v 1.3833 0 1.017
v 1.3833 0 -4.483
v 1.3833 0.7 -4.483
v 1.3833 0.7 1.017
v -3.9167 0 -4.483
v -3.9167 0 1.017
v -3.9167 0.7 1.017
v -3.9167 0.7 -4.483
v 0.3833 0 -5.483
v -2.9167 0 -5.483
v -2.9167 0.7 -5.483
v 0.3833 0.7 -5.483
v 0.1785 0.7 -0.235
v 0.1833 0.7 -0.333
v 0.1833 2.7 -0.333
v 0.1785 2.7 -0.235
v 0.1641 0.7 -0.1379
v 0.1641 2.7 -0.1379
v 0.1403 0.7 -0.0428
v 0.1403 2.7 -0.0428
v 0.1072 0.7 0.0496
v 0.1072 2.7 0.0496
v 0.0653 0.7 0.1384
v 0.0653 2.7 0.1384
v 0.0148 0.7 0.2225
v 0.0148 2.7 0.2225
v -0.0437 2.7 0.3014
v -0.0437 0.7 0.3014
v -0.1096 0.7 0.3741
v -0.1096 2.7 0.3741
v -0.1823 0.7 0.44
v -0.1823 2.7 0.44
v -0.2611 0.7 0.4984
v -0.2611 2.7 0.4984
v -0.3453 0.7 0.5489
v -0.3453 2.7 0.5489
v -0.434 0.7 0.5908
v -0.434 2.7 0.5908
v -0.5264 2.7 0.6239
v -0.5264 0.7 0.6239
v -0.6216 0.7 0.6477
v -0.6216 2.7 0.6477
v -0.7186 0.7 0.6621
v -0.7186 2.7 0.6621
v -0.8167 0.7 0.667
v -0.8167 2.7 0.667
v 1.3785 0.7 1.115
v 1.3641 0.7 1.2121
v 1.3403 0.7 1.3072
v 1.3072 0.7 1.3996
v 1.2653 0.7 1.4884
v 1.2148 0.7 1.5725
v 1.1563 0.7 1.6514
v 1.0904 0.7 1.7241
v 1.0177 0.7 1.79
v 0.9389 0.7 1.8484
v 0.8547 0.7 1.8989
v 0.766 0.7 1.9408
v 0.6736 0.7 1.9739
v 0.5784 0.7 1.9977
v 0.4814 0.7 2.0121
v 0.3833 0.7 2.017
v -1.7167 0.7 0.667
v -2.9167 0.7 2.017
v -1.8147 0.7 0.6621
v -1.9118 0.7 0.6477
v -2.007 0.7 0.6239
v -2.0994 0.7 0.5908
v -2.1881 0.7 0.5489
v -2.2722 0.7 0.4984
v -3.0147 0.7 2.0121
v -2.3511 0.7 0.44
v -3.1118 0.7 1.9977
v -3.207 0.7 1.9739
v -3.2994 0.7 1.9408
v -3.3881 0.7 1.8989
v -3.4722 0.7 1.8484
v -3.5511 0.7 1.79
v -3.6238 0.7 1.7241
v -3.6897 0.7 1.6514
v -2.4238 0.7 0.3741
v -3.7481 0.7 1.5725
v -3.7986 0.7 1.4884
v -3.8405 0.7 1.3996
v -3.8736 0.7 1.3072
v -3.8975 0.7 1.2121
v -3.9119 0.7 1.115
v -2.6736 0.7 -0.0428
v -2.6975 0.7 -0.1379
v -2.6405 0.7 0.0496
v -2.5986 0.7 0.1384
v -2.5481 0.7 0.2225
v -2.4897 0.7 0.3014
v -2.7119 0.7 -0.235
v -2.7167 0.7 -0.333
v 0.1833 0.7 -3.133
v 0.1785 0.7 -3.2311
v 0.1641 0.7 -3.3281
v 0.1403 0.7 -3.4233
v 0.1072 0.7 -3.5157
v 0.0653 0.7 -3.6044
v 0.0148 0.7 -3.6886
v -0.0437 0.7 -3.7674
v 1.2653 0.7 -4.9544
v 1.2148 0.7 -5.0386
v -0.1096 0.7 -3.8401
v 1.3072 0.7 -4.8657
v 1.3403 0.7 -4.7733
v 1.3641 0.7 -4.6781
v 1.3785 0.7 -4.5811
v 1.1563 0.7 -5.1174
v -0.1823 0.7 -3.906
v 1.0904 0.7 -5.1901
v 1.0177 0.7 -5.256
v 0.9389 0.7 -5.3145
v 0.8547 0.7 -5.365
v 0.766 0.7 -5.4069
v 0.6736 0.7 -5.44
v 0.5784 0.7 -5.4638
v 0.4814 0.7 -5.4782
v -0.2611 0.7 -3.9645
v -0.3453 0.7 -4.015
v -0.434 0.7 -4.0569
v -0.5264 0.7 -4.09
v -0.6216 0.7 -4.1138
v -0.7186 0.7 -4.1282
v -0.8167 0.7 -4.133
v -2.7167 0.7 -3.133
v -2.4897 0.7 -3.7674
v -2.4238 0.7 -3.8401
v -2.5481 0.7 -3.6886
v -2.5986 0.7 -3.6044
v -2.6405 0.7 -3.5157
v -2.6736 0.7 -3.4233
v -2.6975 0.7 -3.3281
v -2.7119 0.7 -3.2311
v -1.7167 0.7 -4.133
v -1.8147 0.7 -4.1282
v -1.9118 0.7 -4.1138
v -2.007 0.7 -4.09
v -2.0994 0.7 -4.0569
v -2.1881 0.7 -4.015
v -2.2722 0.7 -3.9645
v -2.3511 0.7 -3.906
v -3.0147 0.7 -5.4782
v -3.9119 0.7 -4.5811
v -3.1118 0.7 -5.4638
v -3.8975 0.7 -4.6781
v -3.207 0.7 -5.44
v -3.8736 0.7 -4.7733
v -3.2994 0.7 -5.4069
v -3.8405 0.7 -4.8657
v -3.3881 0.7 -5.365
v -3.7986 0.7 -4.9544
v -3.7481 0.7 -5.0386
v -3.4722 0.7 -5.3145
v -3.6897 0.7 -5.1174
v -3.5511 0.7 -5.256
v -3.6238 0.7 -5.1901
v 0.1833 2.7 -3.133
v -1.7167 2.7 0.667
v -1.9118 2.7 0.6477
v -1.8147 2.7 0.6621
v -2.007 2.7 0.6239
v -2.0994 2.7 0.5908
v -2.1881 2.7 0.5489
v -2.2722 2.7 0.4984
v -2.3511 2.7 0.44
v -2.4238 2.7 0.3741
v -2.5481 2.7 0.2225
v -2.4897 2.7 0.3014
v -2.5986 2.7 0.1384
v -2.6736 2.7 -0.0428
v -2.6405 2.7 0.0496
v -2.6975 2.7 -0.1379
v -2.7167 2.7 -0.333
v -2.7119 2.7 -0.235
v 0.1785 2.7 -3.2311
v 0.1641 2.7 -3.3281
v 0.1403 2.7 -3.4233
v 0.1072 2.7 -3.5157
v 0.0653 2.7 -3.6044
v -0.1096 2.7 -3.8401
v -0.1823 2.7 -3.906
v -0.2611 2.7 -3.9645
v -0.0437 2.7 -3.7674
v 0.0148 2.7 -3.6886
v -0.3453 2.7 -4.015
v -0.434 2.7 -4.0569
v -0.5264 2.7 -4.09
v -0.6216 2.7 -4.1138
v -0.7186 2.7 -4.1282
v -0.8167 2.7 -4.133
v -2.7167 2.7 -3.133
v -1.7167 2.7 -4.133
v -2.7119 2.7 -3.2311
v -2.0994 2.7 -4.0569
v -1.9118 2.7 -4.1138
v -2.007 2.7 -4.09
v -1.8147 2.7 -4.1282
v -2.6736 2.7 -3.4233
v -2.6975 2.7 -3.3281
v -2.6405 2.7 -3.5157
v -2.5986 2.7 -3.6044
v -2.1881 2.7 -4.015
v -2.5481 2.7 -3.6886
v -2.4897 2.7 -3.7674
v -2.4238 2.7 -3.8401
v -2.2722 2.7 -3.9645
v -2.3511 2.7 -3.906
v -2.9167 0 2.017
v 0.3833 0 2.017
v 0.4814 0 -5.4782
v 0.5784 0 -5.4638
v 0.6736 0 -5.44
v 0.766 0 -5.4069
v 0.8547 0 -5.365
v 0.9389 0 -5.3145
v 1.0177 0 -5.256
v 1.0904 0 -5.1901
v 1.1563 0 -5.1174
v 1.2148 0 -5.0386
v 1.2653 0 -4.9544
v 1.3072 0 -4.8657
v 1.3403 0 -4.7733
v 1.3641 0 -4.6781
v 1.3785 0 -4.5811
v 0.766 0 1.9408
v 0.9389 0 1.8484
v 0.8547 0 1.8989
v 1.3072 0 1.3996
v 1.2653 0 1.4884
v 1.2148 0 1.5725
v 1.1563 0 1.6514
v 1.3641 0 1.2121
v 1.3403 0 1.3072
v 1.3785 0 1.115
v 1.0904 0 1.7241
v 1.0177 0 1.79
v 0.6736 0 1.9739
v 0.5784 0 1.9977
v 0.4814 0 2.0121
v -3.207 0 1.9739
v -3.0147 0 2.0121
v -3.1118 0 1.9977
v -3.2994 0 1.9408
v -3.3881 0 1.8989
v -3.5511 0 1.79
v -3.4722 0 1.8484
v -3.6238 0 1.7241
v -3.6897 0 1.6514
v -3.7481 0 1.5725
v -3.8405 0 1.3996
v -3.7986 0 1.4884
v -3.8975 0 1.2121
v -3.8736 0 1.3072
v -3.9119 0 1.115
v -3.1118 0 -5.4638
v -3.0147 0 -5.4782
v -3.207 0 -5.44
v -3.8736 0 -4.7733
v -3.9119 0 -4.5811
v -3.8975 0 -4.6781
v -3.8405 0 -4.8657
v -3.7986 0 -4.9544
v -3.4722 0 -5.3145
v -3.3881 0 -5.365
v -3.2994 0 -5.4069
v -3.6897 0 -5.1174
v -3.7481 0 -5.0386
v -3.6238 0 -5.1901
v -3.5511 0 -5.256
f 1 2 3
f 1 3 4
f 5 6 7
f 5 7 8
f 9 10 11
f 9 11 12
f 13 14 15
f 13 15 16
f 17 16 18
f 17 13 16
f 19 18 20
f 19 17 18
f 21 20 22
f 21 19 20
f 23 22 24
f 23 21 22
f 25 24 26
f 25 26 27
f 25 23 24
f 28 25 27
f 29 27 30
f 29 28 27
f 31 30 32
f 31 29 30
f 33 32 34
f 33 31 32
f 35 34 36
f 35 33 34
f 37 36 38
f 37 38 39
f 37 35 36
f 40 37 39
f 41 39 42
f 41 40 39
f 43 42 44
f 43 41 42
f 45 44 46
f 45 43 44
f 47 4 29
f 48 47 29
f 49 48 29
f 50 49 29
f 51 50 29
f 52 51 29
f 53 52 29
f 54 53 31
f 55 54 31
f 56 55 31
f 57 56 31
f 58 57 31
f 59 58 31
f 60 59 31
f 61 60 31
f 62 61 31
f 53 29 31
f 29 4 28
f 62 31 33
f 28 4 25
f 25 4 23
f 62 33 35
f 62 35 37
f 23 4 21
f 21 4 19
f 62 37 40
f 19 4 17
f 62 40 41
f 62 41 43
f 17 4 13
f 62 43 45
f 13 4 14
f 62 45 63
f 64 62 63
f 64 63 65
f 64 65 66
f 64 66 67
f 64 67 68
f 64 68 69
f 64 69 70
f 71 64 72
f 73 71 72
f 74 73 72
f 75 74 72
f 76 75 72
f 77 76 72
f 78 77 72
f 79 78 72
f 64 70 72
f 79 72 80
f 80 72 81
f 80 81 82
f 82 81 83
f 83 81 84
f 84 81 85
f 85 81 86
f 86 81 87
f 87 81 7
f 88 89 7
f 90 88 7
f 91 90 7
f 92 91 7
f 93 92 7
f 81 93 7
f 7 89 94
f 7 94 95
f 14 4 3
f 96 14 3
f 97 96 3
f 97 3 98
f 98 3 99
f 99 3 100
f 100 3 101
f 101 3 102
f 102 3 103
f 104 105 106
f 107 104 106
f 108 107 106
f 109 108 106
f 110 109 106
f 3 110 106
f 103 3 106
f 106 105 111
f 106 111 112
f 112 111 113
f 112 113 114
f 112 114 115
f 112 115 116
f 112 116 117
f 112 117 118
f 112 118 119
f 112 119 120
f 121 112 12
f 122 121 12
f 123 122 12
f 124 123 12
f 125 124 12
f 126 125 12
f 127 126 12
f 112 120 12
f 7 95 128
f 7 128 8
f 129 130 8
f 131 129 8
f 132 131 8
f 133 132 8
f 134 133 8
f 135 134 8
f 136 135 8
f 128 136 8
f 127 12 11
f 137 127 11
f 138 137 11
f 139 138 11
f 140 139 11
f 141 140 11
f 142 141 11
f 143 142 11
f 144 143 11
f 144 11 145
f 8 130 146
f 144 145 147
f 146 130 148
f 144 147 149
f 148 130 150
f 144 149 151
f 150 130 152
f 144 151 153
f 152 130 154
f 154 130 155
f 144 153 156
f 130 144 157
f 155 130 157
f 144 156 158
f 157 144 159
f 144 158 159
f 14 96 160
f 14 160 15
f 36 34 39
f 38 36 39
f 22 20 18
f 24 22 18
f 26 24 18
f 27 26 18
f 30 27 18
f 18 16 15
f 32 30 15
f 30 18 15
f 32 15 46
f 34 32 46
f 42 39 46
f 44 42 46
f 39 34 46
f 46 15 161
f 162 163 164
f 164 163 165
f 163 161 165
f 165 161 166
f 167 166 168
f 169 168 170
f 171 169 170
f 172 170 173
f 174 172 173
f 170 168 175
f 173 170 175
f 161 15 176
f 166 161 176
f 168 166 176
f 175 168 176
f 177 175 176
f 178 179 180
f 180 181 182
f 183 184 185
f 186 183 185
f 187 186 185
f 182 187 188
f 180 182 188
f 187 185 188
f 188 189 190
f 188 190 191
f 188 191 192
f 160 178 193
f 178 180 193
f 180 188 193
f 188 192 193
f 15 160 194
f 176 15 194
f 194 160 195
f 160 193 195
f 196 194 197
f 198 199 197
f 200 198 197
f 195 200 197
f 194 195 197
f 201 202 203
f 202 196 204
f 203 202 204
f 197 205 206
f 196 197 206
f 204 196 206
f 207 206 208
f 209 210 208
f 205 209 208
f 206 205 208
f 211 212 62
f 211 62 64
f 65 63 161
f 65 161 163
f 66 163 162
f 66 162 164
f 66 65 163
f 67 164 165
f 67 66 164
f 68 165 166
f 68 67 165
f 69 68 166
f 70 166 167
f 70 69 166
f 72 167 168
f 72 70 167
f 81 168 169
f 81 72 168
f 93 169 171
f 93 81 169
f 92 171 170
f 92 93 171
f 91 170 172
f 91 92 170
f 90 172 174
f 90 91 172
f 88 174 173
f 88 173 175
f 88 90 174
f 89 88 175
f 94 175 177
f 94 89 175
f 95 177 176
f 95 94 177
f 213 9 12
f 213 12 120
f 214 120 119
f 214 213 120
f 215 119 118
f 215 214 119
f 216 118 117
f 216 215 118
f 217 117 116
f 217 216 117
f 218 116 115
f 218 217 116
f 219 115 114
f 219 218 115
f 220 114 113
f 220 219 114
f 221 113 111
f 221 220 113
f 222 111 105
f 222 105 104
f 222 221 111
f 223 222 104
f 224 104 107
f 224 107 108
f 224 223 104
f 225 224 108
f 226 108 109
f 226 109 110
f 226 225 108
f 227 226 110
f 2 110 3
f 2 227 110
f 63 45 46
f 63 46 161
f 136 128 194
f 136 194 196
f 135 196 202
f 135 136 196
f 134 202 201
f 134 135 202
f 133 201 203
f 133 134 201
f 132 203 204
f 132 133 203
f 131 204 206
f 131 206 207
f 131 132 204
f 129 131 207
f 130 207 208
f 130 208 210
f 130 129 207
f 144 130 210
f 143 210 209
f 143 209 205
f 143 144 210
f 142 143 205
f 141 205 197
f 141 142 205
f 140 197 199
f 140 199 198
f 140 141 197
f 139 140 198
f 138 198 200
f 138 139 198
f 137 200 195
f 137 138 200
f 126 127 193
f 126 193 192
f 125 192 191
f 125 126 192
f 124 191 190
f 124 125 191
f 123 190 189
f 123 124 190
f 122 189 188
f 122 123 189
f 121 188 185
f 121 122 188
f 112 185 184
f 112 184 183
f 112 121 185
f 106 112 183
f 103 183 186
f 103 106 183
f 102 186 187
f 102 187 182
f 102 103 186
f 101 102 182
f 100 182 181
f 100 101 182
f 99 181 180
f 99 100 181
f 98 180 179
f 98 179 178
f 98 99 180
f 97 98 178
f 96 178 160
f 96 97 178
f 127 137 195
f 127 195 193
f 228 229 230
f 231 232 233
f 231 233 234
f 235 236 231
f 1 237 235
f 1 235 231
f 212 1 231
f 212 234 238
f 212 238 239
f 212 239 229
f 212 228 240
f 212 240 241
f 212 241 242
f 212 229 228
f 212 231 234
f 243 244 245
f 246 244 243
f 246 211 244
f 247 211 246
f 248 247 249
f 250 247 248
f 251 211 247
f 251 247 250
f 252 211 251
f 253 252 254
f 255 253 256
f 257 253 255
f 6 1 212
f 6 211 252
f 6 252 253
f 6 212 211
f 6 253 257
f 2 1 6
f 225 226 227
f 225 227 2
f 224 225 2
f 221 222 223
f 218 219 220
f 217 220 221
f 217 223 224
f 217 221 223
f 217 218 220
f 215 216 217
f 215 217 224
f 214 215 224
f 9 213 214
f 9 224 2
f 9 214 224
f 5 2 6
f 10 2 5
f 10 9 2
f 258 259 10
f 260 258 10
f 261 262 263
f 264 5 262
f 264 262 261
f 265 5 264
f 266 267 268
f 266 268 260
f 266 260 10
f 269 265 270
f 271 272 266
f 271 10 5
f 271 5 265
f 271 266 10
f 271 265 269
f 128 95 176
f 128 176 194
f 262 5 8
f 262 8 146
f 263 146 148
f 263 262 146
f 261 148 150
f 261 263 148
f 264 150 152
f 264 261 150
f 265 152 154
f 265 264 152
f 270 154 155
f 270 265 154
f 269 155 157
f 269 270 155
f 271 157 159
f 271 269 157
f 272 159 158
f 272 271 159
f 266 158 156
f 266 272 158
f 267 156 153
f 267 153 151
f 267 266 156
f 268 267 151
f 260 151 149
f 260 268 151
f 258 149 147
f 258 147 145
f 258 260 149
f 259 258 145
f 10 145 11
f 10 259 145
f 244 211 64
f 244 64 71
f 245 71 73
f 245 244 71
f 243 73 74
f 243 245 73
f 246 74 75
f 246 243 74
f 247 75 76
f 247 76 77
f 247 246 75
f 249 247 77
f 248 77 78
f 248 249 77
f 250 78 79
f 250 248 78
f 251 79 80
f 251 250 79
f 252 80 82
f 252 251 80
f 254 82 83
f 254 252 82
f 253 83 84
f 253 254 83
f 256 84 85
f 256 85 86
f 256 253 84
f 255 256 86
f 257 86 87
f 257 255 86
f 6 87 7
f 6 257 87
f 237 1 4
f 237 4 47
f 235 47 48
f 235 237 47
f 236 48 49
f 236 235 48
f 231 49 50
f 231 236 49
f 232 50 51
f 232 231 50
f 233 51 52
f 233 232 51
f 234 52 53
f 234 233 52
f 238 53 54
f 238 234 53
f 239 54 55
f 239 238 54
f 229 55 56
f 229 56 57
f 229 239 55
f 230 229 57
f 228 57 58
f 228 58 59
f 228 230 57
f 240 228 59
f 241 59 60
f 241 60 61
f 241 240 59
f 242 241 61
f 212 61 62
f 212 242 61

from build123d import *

# Parameters (mm, degrees)
EXTRUDE_1_DEPTH = 0.7
EXTRUDE_3_DEPTH = 2.7


with BuildPart() as part:
    # 草图1 → 凸台-拉伸1 (new body)
    with BuildSketch(Plane(origin=(0, 0, 0), x_dir=(1, 0, 0), z_dir=(0, 1, 0))):
        with BuildLine():
            Line((0.383333333, 5.483035714), (-2.916666667, 5.483035714))
            ThreePointArc((-2.916666667, 5.483035714), (-3.623773448, 5.190142495), (-3.916666667, 4.483035714))
            Line((-3.916666667, 4.483035714), (-3.916666667, -1.016964286))
            ThreePointArc((-3.916666667, -1.016964286), (-3.623773448, -1.724071067), (-2.916666667, -2.016964286))
            Line((-2.916666667, -2.016964286), (0.383333333, -2.016964286))
            ThreePointArc((0.383333333, -2.016964286), (1.090440115, -1.724071067), (1.383333333, -1.016964286))
            Line((1.383333333, -1.016964286), (1.383333333, 4.483035714))
            ThreePointArc((1.383333333, 4.483035714), (1.090440115, 5.190142495), (0.383333333, 5.483035714))
        make_face()
        with BuildLine():
            ThreePointArc((-2.716666667, 3.133035714), (-2.423773448, 3.840142495), (-1.716666667, 4.133035714))
            Line((-1.716666667, 4.133035714), (-0.816666667, 4.133035714))
            ThreePointArc((-0.816666667, 4.133035714), (-0.109559885, 3.840142495), (0.183333333, 3.133035714))
            Line((0.183333333, 3.133035714), (0.183333333, 0.333035714))
            ThreePointArc((0.183333333, 0.333035714), (-0.109559885, -0.374071067), (-0.816666667, -0.666964286))
            Line((-0.816666667, -0.666964286), (-1.716666667, -0.666964286))
            ThreePointArc((-1.716666667, -0.666964286), (-2.423773448, -0.374071067), (-2.716666667, 0.333035714))
            Line((-2.716666667, 0.333035714), (-2.716666667, 3.133035714))
        make_face(mode=Mode.SUBTRACT)
    extrude(amount=EXTRUDE_1_DEPTH)

    # 草图1<6> → 凸台-拉伸3 (add)
    with BuildSketch(Plane(origin=(0, 0, 0), x_dir=(1, 0, 0), z_dir=(0, 1, 0))):
        with BuildLine():
            Line((-0.816666667, 4.133035714), (-1.716666667, 4.133035714))
            ThreePointArc((-1.716666667, 4.133035714), (-2.423773448, 3.840142495), (-2.716666667, 3.133035714))
            Line((-2.716666667, 3.133035714), (-2.716666667, 0.333035714))
            ThreePointArc((-2.716666667, 0.333035714), (-2.423773448, -0.374071067), (-1.716666667, -0.666964286))
            Line((-1.716666667, -0.666964286), (-0.816666667, -0.666964286))
            ThreePointArc((-0.816666667, -0.666964286), (-0.109559885, -0.374071067), (0.183333333, 0.333035714))
            Line((0.183333333, 0.333035714), (0.183333333, 3.133035714))
            ThreePointArc((0.183333333, 3.133035714), (-0.109559885, 3.840142495), (-0.816666667, 4.133035714))
        make_face()
    extrude(amount=EXTRUDE_3_DEPTH)


solid = part.part
